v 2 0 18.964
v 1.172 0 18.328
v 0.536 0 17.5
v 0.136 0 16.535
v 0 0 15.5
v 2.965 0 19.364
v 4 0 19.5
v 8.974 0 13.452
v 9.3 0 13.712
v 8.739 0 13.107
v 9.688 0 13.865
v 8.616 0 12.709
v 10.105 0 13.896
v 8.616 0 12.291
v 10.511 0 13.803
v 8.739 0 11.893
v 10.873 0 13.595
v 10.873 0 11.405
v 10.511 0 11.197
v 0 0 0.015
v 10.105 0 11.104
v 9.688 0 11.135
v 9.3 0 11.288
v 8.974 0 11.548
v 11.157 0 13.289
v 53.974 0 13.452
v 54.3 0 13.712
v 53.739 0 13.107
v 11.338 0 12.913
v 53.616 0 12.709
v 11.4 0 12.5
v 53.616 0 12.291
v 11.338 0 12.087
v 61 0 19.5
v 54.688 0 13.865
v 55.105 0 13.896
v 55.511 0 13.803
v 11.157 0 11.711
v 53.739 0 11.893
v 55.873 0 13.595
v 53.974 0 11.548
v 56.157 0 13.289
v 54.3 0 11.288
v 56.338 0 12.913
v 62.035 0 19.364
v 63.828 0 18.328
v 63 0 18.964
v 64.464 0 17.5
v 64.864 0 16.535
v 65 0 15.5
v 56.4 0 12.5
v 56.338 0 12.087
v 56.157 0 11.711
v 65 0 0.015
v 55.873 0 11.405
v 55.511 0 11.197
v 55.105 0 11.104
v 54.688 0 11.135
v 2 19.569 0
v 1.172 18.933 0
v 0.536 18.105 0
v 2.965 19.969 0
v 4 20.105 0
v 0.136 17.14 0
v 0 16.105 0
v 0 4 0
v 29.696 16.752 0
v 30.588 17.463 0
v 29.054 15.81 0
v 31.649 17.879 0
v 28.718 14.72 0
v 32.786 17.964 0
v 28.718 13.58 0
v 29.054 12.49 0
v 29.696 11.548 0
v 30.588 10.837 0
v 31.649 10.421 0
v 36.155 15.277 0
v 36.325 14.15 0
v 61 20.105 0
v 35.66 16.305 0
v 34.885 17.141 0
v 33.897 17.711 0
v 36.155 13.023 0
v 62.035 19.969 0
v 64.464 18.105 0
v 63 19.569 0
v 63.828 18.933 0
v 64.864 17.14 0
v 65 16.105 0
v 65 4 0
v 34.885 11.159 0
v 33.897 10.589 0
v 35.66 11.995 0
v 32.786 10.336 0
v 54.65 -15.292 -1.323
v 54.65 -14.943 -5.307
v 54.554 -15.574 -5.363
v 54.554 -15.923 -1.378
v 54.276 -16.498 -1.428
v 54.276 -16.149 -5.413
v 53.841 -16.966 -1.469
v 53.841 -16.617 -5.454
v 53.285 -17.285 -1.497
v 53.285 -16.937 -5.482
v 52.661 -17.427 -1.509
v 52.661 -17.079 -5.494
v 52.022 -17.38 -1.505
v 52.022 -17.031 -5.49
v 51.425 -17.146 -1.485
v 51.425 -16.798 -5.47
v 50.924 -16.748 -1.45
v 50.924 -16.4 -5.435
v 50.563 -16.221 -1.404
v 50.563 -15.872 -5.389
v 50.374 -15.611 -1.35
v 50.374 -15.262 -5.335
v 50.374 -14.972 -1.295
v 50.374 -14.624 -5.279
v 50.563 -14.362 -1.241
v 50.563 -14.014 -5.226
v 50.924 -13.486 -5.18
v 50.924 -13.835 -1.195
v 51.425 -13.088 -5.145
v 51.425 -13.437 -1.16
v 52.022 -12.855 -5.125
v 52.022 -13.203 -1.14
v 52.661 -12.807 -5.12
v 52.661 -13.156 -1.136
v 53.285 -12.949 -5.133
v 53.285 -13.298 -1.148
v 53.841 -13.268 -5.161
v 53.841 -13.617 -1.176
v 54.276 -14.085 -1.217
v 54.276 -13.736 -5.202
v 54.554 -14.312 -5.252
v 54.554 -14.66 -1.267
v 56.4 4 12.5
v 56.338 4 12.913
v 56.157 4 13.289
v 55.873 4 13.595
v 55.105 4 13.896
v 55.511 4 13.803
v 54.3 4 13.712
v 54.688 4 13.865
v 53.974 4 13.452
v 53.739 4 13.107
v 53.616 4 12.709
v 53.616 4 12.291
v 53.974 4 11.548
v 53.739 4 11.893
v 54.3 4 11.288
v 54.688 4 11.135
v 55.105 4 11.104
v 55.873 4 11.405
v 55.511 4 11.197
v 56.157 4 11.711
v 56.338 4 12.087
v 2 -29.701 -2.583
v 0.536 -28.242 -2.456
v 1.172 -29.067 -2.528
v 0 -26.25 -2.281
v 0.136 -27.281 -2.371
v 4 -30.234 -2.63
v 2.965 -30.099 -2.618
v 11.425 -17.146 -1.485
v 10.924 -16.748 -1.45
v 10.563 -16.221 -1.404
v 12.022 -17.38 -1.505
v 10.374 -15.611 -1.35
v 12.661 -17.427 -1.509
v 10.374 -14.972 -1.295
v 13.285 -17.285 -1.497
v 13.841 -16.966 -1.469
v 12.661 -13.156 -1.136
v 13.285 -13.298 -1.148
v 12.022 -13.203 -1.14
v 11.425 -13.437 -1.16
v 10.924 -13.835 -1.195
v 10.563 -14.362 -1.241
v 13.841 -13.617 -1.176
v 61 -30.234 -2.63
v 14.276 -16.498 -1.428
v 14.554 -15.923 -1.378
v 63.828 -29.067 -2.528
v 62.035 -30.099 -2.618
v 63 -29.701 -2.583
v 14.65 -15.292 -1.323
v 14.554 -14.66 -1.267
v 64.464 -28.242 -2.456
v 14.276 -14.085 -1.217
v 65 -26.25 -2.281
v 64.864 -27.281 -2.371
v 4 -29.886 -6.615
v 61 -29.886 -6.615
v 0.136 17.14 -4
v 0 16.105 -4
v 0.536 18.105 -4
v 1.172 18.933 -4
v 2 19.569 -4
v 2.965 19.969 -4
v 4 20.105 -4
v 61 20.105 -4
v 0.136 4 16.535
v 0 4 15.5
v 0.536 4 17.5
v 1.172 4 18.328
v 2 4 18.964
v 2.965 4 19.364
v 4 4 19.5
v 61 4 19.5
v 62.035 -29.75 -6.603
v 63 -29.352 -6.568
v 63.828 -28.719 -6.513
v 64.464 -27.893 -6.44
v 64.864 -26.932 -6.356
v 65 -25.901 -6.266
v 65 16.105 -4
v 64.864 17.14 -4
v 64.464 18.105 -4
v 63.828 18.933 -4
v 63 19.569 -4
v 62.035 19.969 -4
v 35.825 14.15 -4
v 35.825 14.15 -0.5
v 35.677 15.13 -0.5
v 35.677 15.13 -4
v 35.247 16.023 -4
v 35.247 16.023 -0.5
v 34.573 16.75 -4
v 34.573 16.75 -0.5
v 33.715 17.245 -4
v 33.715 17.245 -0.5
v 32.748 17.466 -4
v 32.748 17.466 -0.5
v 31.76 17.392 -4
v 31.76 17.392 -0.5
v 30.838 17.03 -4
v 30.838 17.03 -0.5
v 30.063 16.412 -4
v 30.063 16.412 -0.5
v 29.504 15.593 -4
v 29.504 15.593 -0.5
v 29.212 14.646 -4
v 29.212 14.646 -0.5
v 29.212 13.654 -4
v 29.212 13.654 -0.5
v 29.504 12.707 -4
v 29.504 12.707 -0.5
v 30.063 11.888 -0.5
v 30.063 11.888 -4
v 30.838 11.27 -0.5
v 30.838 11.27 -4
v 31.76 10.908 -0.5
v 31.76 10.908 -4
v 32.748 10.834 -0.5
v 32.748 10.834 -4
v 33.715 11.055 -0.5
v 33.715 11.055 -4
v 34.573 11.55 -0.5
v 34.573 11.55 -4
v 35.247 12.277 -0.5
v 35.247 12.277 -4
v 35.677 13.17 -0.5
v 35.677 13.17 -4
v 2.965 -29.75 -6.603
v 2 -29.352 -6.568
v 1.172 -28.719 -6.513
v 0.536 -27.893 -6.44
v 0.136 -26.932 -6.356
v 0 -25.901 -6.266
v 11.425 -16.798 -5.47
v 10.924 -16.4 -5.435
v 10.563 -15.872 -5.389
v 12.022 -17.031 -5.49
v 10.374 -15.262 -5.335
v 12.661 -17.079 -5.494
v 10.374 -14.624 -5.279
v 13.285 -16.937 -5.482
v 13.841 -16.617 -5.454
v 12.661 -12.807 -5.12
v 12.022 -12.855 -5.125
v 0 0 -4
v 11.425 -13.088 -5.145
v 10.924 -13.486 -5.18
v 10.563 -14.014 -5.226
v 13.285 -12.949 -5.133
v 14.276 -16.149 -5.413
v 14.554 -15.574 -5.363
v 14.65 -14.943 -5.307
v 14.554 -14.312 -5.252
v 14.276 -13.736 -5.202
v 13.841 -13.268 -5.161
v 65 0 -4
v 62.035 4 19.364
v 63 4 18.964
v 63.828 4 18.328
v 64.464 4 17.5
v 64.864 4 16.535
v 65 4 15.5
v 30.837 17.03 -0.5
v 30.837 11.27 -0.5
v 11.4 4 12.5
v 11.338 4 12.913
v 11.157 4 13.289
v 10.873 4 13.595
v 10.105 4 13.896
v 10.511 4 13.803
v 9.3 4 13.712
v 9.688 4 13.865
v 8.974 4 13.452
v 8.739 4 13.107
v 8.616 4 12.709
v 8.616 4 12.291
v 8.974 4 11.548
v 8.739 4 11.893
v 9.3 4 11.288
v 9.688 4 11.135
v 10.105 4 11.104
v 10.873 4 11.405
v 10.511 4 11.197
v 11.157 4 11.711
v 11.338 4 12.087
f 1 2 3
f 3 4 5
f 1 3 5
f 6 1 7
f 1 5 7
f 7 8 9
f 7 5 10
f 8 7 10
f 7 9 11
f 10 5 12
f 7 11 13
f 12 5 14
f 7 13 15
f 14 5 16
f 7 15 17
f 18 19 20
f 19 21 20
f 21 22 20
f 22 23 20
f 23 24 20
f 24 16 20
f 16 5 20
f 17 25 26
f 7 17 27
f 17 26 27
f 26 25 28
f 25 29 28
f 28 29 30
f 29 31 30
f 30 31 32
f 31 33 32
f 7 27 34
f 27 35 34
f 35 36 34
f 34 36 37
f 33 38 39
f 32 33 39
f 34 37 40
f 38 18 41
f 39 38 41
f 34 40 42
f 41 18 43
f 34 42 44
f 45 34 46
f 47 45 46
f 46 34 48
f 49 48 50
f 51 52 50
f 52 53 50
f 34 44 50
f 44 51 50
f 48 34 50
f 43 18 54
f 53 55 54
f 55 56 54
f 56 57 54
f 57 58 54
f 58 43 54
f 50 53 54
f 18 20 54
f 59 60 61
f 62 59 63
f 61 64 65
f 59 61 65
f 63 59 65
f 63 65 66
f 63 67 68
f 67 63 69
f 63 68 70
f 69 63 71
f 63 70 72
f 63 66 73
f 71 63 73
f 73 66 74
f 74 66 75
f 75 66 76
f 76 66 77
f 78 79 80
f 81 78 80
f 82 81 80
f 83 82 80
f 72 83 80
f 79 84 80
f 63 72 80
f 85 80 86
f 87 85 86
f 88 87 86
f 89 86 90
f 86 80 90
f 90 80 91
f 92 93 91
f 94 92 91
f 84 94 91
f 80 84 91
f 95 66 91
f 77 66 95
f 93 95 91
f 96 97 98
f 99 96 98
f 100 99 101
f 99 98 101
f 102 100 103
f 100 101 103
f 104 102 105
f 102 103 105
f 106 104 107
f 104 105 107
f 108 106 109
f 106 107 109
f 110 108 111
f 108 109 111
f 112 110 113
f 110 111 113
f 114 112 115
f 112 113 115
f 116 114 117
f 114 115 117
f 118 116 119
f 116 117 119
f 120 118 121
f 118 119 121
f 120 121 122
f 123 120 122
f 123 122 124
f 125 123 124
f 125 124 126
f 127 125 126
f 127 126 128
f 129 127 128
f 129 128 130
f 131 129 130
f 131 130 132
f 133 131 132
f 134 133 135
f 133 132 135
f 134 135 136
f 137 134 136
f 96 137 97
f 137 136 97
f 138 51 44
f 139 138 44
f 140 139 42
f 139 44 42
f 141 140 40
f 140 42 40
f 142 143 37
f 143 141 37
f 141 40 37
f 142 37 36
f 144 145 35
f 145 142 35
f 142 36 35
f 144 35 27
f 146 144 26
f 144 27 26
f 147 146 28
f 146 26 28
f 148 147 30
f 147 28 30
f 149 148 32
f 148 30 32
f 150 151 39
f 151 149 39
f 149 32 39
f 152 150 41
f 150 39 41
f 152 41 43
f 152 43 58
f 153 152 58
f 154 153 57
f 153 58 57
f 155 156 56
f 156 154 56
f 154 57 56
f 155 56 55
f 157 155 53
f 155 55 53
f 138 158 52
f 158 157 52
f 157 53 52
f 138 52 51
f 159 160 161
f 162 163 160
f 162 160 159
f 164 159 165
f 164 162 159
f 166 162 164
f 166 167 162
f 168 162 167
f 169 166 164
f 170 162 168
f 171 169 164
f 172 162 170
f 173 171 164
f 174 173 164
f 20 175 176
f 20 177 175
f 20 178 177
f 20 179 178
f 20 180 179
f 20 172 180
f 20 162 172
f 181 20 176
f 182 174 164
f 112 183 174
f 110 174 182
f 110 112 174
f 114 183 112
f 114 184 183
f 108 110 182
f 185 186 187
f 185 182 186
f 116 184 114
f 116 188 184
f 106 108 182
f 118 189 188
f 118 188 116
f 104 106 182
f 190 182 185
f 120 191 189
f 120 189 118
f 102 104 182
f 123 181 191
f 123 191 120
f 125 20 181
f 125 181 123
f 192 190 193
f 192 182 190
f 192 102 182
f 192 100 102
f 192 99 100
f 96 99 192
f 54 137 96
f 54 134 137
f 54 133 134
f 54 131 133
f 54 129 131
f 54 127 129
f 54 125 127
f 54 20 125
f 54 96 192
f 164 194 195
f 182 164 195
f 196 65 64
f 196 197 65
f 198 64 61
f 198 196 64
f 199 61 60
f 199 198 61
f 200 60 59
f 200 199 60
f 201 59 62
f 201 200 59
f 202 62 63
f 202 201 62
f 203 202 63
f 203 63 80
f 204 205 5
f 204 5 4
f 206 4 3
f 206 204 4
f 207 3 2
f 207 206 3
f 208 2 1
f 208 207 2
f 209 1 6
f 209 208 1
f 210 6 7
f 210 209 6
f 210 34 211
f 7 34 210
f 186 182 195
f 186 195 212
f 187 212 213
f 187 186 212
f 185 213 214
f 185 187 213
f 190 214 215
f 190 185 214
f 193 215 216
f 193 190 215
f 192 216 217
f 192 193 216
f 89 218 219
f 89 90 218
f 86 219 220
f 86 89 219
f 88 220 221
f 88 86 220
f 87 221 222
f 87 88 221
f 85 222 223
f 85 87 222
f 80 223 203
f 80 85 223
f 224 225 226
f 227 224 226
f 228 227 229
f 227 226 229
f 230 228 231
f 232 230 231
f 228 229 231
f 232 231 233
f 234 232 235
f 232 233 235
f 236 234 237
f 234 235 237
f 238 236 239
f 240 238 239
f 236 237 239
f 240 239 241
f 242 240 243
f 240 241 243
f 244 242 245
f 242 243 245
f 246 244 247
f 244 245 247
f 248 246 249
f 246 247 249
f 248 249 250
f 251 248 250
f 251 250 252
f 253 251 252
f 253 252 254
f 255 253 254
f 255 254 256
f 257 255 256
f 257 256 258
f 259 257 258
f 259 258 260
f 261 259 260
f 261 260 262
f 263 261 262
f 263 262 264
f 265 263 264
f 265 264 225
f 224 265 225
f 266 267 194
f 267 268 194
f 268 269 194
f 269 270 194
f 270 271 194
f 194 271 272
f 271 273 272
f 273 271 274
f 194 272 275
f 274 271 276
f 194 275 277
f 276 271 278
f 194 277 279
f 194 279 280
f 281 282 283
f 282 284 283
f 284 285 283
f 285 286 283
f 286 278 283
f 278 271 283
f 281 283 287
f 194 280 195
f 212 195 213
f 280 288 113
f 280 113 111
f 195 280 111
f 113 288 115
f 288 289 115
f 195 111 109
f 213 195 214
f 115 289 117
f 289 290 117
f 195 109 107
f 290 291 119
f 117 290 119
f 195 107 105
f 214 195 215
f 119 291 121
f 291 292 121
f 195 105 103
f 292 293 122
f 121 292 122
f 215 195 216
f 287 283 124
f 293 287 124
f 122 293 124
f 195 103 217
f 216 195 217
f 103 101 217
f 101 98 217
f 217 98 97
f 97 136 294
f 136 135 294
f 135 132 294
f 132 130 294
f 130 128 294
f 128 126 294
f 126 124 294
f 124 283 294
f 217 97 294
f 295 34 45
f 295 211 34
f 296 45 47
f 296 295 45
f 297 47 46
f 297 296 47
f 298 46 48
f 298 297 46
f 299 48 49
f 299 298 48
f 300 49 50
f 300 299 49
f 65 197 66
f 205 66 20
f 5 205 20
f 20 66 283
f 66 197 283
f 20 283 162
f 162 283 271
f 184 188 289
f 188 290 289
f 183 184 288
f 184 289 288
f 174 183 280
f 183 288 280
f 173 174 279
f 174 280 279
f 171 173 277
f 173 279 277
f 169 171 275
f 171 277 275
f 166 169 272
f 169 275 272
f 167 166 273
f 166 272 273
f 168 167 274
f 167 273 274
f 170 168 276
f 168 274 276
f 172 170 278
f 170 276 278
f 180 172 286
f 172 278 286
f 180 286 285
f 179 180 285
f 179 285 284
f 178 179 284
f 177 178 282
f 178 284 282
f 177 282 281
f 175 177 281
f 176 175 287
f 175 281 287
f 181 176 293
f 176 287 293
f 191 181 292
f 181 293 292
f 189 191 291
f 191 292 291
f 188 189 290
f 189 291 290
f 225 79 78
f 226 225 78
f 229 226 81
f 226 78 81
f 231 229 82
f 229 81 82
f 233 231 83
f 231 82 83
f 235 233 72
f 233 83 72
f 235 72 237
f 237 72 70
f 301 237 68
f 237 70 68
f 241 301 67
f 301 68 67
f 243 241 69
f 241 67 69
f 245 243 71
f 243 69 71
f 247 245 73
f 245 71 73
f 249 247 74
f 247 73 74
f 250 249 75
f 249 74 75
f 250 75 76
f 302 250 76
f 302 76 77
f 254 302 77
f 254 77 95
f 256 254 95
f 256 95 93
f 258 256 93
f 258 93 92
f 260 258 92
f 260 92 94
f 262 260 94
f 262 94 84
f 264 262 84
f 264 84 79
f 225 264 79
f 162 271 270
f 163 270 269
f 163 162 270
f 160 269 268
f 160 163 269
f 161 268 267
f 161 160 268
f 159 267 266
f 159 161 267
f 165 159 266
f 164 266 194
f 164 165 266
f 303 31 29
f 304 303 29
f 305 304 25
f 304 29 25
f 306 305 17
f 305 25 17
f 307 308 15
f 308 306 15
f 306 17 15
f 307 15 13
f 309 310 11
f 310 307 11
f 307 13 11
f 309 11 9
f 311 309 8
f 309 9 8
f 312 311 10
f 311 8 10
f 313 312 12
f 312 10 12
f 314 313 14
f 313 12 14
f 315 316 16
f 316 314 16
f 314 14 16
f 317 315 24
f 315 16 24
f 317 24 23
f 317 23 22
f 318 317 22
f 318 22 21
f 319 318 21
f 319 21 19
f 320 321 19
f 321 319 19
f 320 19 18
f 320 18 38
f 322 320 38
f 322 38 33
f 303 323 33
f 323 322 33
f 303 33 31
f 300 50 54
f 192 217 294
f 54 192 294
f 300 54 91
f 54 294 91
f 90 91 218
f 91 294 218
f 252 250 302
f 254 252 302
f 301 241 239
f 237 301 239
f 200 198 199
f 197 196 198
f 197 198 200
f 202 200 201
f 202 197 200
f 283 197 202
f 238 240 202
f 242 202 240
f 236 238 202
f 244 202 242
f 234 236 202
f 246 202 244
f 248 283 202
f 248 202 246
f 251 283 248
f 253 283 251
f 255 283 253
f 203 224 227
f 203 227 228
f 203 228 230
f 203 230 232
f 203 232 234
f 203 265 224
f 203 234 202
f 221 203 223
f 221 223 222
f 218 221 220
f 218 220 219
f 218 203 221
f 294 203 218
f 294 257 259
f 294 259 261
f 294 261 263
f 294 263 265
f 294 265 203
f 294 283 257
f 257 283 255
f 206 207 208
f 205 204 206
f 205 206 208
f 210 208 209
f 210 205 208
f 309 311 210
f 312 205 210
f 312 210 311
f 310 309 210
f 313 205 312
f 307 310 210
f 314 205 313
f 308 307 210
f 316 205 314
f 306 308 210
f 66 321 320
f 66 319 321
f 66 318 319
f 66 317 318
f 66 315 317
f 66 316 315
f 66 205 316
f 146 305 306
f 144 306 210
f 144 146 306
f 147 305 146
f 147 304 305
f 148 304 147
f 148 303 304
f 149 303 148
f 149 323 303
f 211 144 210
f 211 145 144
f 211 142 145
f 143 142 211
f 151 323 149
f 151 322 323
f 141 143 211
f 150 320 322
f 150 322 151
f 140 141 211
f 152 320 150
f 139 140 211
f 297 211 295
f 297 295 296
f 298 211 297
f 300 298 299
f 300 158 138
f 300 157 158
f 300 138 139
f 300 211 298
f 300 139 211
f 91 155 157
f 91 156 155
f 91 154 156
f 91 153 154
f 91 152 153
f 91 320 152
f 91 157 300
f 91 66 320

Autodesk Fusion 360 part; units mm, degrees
sketch "草图6" plane through (0, 0, 0) normal (0, 1, 0) x (1, 0, 0)
  line L0 (0, 0) -> (65, 0)
  line L1 (65, 0) -> (65, -19.5)
  line L2 (65, -19.5) -> (0, -19.5)
  line L3 (0, -19.5) -> (0, 0)
  line L4 (0, 0) -> (0, 4)
  line L5 (0, 4) -> (65, 4)
  line L6 (65, 4) -> (65, 0)
  circle A0 centre (10, -12.5) radius 1.4
  circle A1 centre (55, -12.5) radius 1.4
  line L7 (32.5, -19.5) -> (32.5, 4) construction
  dimension "d31" = 65
  dimension "d32" = 19.5
  dimension "d33" = 4
  dimension "d34" = 7
  dimension "d35" = 2.8
  dimension "d36" = 45
extrude "拉伸5" add sketch "草图6" along normal blind 4 contours L0 L1 L2 L3 makes body 1
extrude "拉伸6" add sketch "草图6" along normal blind 20.105 contours L0 L4 L5 L6 bodies 1
sketch "草图7" plane through (0, 0, 0) normal (0, 0, 1) x (1, 0, 0)
  line L0 (0, 4) -> (65, 4)
  line L1 (65, 4) -> (65, 20.105)
  line L2 (65, 20.105) -> (0, 20.105)
  line L3 (0, 20.105) -> (0, 4)
  circle A0 centre (32.5, 14.15) radius 3.325
  line L4 (32.5, 4) -> (32.5, 20.105) construction
  circle A1 centre (32.5, 14.15) radius 3.825
  dimension "d41" = 10.15
  dimension "d42" = 6.65
  dimension "d43" = 7.65
extrude "拉伸7" cut sketch "草图7" against normal blind 4 contours A0 bodies 1
extrude "拉伸8" cut sketch "草图7" against normal blind 0.5 contours A1 bodies 1
chamfer "倒角1" distance 0.5 angle 45 1 edges at (28.9338, 15.5332, -0.5) on bodies 1
fillet "圆角1" radius 4 1 edges at (0, 2, 19.5) on bodies 1
fillet "圆角2" radius 4 1 edges at (65, 2, 19.5) on bodies 1
fillet "圆角3" radius 1 1 edges at (32.5, 4, 0) on bodies 1
fillet "圆角4" radius 4 1 edges at (32.5, 0, -4) on bodies 1
fillet "圆角5" radius 4 1 edges at (0, 20.105, -2) on bodies 1
fillet "圆角6" radius 4 1 edges at (65, 20.105, -2) on bodies 1
delete_face "删除面1" 1 faces at (21.6667, 3.8097, -3.9955) on bodies 1
ref_plane "工作平面1" through (32.5, 0, -4) normal (0, -0.0872, 0.9962) x (1, 0, 0)
sketch "草图8" plane through (0, 0.3473, -3.9696) normal (0, -0.0872, 0.9962) x (1, 0, 0)
  line L0 (0, -0.3486) -> (65, -0.3486)
  line L1 (0, -0.3486) -> (0, -30.3486)
  line L2 (0, -30.3486) -> (65, -30.3486)
  line L3 (65, -30.3486) -> (65, -0.3486)
  line L4 (0, -15.3486) -> (65, -15.3486) construction
  circle A0 centre (12.5, -15.3486) radius 2.15
  line L5 (32.5, -0.3486) -> (32.5, -30.3486) construction
  circle A1 centre (52.5, -15.3486) radius 2.15
  point P0 (0, -0.3486)
  point P1 (65, -0.3486)
  dimension "d62" = 30
  dimension "d64" = 4.3
  dimension "d65" = 40
extrude "拉伸9" add sketch "草图8" along normal blind 4 separate body makes body 2
extrude "拉伸10" add 1 faces at (21.6667, -0.2324, -1.3435) along direction (0, 0.996195, 0.087156) blind 0.877 on bodies 2 bodies 1 2
fillet "圆角7" radius 4 2 edges at (65, -30.0602, -4.6223) (0, -30.0602, -4.6223) on bodies 1
fillet "圆角8" radius 4 1 edges at (32.5, 0, 0.0153) on bodies 1
delete_face "删除面2" 1 faces at (43.3333, -3.2596, -0.2503) on bodies 1
delete_face "删除面3" 1 faces at (21.6667, 4.4199, 0.1854) on bodies 1
extrude "拉伸3" [suppressed]
sketch "草图4" plane through (0, 0, 0) normal (0, 1, 0) x (1, 0, 0)
  line L0 (0, 0) -> (65, 0)
  line L1 (65, 0) -> (65, -25.17)
  line L2 (65, -25.17) -> (0, -25.17)
  line L3 (0, -25.17) -> (0, 0)
  line L4 (0, -7) -> (65, -7) construction
  circle A0 centre (10, -7) radius 1.25
  line L5 (32.5, 0) -> (32.5, -25.17) construction
  circle A1 centre (55, -7) radius 1.25
  line L6 (0, -21.17) -> (65, -21.17)
  dimension "d23" = 25.17
  dimension "d24" = 65
  dimension "d25" = 2.5
  dimension "d26" = 45
  dimension "d27" = 7
  dimension "d28" = 4
extrude "拉伸4" [suppressed]
sketch "草图5" plane through (0, 0, 25.17) normal (0, 0, 1) x (1, 0, 0)
  line L0 (0, 0) -> (65, 0)
  line L1 (65, 0) -> (65, 4)
  line L2 (65, 4) -> (0, 4)
  line L3 (0, 4) -> (0, 0)
equation "d23 = 14 mm + 7.17 mm + 4 mm"
equation "d39 = 16.105 mm + 4 mm"
